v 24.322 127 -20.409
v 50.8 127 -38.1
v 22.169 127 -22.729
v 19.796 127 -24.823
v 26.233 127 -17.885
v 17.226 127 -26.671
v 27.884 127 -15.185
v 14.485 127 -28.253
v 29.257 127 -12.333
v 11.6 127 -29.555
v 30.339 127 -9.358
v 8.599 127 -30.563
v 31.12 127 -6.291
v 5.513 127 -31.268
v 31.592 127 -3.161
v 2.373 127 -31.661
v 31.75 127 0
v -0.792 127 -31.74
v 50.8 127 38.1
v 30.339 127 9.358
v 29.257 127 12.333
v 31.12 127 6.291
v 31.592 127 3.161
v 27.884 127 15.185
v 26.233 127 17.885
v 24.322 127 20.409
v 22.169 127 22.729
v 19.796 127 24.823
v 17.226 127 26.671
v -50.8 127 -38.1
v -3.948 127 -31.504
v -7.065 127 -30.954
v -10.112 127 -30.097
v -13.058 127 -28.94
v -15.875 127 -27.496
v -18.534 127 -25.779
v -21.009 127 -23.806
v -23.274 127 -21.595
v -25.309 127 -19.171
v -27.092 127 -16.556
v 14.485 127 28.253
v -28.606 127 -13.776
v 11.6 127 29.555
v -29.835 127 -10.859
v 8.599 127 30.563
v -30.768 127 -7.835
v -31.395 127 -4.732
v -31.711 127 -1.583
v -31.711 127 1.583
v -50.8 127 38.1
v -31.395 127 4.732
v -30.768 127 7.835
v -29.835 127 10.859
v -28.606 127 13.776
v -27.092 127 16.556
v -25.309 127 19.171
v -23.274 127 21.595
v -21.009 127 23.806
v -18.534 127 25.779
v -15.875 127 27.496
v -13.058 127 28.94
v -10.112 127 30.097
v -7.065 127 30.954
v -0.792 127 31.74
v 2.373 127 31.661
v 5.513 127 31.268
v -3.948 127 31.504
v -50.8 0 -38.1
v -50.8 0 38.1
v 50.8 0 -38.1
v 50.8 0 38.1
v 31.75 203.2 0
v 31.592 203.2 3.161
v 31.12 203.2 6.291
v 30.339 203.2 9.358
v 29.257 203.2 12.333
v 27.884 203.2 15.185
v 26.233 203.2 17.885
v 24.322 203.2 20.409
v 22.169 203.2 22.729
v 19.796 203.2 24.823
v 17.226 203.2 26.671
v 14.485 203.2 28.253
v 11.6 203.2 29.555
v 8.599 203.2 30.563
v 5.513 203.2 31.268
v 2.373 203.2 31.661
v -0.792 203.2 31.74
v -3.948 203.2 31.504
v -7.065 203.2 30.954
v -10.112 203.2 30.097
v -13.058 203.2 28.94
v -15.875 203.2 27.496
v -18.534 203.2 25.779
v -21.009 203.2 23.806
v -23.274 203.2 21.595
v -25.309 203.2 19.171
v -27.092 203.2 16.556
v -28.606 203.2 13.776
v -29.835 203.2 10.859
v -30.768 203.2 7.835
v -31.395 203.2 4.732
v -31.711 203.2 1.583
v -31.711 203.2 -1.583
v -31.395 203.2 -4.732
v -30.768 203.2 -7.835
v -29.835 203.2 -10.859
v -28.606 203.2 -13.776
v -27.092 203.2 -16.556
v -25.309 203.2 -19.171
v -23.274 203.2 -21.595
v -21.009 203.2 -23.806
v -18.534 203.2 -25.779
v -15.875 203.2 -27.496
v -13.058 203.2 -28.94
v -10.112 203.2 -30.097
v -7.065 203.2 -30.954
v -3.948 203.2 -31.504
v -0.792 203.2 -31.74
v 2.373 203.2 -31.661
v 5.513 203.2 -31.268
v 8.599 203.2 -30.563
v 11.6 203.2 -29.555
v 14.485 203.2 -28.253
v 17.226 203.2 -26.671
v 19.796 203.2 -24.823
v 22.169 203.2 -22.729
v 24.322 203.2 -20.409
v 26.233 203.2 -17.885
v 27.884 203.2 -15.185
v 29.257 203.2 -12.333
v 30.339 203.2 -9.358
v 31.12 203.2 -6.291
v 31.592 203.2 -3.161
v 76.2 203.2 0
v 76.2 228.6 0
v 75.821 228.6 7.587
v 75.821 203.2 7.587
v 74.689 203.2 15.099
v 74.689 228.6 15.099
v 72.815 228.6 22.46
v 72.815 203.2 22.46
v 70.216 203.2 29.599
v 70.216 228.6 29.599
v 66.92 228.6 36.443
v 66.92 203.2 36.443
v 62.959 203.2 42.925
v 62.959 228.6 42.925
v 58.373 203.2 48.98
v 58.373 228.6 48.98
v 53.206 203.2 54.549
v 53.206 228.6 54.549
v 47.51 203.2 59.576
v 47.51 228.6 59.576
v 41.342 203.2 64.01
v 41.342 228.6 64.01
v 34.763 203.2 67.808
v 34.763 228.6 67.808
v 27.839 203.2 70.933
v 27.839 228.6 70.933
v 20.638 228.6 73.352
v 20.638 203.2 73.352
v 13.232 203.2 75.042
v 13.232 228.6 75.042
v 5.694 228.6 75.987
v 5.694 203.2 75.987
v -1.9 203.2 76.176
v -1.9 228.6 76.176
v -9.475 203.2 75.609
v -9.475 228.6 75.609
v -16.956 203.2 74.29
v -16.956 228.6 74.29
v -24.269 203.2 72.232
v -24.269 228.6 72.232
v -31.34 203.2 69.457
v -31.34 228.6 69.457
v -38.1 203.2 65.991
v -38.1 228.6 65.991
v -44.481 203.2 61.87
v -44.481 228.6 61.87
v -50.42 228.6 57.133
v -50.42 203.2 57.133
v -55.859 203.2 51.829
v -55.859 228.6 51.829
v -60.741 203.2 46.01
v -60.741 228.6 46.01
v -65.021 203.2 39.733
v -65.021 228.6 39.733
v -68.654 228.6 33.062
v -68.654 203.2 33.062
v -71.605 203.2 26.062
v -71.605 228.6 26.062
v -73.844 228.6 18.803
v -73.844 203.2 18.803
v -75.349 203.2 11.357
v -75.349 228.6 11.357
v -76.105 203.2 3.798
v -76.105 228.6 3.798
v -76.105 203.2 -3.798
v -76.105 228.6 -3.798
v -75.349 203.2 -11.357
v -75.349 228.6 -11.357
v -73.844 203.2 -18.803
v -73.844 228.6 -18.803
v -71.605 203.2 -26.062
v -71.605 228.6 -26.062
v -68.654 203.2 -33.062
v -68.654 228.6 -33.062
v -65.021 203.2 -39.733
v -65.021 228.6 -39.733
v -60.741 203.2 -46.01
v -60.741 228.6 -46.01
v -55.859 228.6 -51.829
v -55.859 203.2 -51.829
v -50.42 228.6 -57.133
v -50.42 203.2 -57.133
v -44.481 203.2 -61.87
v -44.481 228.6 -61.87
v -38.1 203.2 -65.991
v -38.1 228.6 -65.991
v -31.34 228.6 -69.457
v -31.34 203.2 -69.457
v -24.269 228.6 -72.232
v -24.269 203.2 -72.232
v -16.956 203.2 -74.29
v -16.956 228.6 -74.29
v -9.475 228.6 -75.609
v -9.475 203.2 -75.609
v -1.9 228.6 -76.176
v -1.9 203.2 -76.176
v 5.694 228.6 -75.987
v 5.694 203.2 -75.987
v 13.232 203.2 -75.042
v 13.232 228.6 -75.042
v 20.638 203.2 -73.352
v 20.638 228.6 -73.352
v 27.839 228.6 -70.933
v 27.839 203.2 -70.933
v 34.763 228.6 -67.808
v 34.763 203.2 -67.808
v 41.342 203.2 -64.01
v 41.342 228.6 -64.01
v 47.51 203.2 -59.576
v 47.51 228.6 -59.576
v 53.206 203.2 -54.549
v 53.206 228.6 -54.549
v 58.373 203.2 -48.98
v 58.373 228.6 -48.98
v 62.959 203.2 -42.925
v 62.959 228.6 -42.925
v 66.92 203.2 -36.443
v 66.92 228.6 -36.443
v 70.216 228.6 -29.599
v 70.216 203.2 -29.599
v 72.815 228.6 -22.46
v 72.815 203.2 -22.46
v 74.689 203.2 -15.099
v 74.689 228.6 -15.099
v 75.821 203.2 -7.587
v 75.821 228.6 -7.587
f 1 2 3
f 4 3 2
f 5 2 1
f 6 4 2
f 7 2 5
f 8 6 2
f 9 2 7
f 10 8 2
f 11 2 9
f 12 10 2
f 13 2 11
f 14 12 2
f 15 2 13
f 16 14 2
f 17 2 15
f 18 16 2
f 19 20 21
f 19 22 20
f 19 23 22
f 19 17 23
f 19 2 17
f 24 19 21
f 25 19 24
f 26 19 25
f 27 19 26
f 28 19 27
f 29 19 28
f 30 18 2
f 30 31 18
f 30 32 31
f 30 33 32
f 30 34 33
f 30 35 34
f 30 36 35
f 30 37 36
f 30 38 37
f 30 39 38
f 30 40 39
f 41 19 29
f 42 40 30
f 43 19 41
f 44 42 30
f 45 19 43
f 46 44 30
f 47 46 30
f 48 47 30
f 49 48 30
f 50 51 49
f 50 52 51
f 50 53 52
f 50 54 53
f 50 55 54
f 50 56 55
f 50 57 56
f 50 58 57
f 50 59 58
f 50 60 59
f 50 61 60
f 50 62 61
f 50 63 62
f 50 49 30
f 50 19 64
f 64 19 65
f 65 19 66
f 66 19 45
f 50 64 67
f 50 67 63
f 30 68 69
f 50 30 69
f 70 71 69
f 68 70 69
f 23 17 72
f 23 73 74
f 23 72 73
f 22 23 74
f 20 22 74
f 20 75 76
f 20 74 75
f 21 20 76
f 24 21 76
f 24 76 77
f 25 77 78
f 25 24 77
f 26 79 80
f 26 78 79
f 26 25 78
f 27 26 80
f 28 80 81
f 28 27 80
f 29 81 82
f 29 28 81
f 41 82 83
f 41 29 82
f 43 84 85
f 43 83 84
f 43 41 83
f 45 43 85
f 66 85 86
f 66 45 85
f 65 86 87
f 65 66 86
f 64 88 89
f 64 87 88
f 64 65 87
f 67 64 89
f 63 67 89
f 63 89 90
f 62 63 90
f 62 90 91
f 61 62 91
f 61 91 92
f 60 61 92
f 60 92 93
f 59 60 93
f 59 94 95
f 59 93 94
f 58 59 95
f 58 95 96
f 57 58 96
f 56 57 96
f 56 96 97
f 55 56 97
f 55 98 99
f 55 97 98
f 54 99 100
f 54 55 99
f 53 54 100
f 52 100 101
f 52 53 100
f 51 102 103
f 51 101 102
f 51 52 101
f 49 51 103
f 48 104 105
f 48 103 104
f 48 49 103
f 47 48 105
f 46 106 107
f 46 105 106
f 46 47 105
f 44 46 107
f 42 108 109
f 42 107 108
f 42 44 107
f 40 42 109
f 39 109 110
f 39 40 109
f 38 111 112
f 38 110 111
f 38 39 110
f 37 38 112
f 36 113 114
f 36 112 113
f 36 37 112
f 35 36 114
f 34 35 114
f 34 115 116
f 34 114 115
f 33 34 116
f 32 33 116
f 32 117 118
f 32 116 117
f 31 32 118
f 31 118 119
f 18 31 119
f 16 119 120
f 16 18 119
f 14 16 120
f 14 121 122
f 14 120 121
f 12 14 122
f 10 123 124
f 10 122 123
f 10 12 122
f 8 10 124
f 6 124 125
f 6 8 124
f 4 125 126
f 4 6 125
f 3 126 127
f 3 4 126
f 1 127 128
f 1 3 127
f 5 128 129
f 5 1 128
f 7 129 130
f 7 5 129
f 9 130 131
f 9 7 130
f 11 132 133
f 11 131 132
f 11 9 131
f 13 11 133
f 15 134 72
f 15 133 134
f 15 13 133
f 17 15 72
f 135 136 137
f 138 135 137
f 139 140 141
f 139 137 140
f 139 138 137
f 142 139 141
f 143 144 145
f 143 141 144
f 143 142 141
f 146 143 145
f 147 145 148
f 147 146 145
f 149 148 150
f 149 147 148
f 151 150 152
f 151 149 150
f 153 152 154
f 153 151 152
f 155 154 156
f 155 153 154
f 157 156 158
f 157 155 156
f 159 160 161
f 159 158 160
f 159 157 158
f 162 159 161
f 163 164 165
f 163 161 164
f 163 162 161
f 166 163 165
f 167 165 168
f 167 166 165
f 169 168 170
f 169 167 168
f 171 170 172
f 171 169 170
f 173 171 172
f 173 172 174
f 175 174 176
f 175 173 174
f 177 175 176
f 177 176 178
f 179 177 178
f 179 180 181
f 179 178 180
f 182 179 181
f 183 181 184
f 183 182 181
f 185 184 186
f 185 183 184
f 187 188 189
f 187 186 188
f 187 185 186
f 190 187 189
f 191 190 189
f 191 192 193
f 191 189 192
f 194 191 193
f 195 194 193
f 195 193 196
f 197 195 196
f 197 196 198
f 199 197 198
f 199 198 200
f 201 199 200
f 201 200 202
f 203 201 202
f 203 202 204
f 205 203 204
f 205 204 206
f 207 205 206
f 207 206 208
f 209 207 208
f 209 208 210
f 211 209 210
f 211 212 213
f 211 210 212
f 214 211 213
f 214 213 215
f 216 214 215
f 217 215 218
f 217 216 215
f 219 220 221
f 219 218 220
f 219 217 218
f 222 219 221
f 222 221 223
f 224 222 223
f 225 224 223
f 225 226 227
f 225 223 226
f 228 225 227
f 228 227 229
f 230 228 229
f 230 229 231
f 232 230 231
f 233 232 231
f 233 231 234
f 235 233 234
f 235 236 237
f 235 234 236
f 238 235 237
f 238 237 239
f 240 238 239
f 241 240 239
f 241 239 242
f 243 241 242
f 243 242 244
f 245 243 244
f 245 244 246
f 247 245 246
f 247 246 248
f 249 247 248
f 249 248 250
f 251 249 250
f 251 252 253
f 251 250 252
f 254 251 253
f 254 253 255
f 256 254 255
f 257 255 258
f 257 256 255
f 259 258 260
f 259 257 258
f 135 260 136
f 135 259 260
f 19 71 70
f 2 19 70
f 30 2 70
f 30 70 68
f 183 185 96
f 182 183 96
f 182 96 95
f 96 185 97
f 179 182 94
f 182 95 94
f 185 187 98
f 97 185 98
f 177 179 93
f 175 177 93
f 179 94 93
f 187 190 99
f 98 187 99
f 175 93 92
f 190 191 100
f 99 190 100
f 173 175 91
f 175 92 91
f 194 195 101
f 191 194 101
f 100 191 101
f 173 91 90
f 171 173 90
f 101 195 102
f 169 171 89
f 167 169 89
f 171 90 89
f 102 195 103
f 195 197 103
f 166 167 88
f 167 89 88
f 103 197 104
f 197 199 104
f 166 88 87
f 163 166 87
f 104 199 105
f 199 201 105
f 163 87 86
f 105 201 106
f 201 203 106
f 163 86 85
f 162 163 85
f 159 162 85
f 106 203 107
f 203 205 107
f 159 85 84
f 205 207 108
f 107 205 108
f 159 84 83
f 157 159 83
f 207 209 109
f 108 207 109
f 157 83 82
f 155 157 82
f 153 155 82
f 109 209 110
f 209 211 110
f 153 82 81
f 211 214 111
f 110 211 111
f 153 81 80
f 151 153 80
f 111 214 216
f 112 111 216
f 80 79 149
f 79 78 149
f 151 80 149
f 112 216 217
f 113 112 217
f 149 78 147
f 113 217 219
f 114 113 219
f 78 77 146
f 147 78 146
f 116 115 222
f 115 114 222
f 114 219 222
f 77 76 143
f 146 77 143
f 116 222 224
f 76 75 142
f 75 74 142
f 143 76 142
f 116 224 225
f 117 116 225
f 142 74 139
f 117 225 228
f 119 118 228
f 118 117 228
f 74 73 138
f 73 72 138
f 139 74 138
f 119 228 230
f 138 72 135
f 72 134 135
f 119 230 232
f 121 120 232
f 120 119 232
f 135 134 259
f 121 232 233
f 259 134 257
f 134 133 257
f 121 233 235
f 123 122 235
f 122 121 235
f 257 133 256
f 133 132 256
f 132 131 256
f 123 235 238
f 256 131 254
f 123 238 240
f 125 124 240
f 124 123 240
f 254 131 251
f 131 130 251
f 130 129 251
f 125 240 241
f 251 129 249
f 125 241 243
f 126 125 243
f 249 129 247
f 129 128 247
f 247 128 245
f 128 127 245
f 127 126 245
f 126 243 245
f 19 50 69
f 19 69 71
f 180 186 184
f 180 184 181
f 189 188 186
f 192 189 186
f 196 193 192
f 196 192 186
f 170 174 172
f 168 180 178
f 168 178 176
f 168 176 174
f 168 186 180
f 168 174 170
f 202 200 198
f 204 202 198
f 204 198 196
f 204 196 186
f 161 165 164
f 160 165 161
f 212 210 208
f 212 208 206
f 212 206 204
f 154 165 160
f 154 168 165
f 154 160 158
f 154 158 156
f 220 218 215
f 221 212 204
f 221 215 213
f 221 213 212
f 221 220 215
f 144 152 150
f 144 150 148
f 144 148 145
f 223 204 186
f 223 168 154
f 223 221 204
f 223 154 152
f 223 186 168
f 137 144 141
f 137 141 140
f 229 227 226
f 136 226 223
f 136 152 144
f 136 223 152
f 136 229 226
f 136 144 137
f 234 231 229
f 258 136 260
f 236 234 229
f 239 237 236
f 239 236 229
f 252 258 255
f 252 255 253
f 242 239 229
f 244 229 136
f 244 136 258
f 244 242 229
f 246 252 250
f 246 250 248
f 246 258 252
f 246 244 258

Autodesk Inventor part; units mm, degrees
ref_plane "YZ Plane" through (0, 0, 0) normal (1, 0, 0) x (0, 1, 0)
ref_plane "XZ Plane" through (0, 0, 0) normal (0, 1, 0) x (-1, 0, 0)
ref_plane "XY Plane" through (0, 0, 0) normal (0, 0, 1) x (1, 0, 0)
sketch "Sketch1" plane through (0, 0, 0) normal (0, 1, 0) x (-1, 0, 0)
  line L0 (-50.8, -38.1) -> (50.8, -38.1)
  line L1 (50.8, -38.1) -> (50.8, 38.1)
  line L2 (50.8, 38.1) -> (-50.8, 38.1)
  line L3 (-50.8, 38.1) -> (-50.8, -38.1)
  line L4 (-50.8, -38.1) -> (50.8, 38.1) construction
  line L5 (50.8, -38.1) -> (-50.8, 38.1) construction
  point P0 (0, 0)
  dimension "d0" = 101.6
  dimension "d1" = 76.2
extrude "Extrusion1" add sketch "Sketch1" along normal blind 127
sketch "Sketch2" plane through (0, 127, 0) normal (0, 1, 0) x (1, 0, 0)
  circle A0 centre (0, 0) radius 31.75
  dimension "d4" = 63.5
extrude "Extrusion2" add sketch "Sketch2" along normal blind 76.2
sketch "Sketch3" plane through (0, 203.2, 0) normal (0, 1, 0) x (1, 0, 0)
  circle A0 centre (0, 0) radius 76.2
  dimension "d7" = 152.4
extrude "Extrusion3" add sketch "Sketch3" along normal blind 25.4
properties part number "medidorPresion" material "Thermoplastic Resin"
